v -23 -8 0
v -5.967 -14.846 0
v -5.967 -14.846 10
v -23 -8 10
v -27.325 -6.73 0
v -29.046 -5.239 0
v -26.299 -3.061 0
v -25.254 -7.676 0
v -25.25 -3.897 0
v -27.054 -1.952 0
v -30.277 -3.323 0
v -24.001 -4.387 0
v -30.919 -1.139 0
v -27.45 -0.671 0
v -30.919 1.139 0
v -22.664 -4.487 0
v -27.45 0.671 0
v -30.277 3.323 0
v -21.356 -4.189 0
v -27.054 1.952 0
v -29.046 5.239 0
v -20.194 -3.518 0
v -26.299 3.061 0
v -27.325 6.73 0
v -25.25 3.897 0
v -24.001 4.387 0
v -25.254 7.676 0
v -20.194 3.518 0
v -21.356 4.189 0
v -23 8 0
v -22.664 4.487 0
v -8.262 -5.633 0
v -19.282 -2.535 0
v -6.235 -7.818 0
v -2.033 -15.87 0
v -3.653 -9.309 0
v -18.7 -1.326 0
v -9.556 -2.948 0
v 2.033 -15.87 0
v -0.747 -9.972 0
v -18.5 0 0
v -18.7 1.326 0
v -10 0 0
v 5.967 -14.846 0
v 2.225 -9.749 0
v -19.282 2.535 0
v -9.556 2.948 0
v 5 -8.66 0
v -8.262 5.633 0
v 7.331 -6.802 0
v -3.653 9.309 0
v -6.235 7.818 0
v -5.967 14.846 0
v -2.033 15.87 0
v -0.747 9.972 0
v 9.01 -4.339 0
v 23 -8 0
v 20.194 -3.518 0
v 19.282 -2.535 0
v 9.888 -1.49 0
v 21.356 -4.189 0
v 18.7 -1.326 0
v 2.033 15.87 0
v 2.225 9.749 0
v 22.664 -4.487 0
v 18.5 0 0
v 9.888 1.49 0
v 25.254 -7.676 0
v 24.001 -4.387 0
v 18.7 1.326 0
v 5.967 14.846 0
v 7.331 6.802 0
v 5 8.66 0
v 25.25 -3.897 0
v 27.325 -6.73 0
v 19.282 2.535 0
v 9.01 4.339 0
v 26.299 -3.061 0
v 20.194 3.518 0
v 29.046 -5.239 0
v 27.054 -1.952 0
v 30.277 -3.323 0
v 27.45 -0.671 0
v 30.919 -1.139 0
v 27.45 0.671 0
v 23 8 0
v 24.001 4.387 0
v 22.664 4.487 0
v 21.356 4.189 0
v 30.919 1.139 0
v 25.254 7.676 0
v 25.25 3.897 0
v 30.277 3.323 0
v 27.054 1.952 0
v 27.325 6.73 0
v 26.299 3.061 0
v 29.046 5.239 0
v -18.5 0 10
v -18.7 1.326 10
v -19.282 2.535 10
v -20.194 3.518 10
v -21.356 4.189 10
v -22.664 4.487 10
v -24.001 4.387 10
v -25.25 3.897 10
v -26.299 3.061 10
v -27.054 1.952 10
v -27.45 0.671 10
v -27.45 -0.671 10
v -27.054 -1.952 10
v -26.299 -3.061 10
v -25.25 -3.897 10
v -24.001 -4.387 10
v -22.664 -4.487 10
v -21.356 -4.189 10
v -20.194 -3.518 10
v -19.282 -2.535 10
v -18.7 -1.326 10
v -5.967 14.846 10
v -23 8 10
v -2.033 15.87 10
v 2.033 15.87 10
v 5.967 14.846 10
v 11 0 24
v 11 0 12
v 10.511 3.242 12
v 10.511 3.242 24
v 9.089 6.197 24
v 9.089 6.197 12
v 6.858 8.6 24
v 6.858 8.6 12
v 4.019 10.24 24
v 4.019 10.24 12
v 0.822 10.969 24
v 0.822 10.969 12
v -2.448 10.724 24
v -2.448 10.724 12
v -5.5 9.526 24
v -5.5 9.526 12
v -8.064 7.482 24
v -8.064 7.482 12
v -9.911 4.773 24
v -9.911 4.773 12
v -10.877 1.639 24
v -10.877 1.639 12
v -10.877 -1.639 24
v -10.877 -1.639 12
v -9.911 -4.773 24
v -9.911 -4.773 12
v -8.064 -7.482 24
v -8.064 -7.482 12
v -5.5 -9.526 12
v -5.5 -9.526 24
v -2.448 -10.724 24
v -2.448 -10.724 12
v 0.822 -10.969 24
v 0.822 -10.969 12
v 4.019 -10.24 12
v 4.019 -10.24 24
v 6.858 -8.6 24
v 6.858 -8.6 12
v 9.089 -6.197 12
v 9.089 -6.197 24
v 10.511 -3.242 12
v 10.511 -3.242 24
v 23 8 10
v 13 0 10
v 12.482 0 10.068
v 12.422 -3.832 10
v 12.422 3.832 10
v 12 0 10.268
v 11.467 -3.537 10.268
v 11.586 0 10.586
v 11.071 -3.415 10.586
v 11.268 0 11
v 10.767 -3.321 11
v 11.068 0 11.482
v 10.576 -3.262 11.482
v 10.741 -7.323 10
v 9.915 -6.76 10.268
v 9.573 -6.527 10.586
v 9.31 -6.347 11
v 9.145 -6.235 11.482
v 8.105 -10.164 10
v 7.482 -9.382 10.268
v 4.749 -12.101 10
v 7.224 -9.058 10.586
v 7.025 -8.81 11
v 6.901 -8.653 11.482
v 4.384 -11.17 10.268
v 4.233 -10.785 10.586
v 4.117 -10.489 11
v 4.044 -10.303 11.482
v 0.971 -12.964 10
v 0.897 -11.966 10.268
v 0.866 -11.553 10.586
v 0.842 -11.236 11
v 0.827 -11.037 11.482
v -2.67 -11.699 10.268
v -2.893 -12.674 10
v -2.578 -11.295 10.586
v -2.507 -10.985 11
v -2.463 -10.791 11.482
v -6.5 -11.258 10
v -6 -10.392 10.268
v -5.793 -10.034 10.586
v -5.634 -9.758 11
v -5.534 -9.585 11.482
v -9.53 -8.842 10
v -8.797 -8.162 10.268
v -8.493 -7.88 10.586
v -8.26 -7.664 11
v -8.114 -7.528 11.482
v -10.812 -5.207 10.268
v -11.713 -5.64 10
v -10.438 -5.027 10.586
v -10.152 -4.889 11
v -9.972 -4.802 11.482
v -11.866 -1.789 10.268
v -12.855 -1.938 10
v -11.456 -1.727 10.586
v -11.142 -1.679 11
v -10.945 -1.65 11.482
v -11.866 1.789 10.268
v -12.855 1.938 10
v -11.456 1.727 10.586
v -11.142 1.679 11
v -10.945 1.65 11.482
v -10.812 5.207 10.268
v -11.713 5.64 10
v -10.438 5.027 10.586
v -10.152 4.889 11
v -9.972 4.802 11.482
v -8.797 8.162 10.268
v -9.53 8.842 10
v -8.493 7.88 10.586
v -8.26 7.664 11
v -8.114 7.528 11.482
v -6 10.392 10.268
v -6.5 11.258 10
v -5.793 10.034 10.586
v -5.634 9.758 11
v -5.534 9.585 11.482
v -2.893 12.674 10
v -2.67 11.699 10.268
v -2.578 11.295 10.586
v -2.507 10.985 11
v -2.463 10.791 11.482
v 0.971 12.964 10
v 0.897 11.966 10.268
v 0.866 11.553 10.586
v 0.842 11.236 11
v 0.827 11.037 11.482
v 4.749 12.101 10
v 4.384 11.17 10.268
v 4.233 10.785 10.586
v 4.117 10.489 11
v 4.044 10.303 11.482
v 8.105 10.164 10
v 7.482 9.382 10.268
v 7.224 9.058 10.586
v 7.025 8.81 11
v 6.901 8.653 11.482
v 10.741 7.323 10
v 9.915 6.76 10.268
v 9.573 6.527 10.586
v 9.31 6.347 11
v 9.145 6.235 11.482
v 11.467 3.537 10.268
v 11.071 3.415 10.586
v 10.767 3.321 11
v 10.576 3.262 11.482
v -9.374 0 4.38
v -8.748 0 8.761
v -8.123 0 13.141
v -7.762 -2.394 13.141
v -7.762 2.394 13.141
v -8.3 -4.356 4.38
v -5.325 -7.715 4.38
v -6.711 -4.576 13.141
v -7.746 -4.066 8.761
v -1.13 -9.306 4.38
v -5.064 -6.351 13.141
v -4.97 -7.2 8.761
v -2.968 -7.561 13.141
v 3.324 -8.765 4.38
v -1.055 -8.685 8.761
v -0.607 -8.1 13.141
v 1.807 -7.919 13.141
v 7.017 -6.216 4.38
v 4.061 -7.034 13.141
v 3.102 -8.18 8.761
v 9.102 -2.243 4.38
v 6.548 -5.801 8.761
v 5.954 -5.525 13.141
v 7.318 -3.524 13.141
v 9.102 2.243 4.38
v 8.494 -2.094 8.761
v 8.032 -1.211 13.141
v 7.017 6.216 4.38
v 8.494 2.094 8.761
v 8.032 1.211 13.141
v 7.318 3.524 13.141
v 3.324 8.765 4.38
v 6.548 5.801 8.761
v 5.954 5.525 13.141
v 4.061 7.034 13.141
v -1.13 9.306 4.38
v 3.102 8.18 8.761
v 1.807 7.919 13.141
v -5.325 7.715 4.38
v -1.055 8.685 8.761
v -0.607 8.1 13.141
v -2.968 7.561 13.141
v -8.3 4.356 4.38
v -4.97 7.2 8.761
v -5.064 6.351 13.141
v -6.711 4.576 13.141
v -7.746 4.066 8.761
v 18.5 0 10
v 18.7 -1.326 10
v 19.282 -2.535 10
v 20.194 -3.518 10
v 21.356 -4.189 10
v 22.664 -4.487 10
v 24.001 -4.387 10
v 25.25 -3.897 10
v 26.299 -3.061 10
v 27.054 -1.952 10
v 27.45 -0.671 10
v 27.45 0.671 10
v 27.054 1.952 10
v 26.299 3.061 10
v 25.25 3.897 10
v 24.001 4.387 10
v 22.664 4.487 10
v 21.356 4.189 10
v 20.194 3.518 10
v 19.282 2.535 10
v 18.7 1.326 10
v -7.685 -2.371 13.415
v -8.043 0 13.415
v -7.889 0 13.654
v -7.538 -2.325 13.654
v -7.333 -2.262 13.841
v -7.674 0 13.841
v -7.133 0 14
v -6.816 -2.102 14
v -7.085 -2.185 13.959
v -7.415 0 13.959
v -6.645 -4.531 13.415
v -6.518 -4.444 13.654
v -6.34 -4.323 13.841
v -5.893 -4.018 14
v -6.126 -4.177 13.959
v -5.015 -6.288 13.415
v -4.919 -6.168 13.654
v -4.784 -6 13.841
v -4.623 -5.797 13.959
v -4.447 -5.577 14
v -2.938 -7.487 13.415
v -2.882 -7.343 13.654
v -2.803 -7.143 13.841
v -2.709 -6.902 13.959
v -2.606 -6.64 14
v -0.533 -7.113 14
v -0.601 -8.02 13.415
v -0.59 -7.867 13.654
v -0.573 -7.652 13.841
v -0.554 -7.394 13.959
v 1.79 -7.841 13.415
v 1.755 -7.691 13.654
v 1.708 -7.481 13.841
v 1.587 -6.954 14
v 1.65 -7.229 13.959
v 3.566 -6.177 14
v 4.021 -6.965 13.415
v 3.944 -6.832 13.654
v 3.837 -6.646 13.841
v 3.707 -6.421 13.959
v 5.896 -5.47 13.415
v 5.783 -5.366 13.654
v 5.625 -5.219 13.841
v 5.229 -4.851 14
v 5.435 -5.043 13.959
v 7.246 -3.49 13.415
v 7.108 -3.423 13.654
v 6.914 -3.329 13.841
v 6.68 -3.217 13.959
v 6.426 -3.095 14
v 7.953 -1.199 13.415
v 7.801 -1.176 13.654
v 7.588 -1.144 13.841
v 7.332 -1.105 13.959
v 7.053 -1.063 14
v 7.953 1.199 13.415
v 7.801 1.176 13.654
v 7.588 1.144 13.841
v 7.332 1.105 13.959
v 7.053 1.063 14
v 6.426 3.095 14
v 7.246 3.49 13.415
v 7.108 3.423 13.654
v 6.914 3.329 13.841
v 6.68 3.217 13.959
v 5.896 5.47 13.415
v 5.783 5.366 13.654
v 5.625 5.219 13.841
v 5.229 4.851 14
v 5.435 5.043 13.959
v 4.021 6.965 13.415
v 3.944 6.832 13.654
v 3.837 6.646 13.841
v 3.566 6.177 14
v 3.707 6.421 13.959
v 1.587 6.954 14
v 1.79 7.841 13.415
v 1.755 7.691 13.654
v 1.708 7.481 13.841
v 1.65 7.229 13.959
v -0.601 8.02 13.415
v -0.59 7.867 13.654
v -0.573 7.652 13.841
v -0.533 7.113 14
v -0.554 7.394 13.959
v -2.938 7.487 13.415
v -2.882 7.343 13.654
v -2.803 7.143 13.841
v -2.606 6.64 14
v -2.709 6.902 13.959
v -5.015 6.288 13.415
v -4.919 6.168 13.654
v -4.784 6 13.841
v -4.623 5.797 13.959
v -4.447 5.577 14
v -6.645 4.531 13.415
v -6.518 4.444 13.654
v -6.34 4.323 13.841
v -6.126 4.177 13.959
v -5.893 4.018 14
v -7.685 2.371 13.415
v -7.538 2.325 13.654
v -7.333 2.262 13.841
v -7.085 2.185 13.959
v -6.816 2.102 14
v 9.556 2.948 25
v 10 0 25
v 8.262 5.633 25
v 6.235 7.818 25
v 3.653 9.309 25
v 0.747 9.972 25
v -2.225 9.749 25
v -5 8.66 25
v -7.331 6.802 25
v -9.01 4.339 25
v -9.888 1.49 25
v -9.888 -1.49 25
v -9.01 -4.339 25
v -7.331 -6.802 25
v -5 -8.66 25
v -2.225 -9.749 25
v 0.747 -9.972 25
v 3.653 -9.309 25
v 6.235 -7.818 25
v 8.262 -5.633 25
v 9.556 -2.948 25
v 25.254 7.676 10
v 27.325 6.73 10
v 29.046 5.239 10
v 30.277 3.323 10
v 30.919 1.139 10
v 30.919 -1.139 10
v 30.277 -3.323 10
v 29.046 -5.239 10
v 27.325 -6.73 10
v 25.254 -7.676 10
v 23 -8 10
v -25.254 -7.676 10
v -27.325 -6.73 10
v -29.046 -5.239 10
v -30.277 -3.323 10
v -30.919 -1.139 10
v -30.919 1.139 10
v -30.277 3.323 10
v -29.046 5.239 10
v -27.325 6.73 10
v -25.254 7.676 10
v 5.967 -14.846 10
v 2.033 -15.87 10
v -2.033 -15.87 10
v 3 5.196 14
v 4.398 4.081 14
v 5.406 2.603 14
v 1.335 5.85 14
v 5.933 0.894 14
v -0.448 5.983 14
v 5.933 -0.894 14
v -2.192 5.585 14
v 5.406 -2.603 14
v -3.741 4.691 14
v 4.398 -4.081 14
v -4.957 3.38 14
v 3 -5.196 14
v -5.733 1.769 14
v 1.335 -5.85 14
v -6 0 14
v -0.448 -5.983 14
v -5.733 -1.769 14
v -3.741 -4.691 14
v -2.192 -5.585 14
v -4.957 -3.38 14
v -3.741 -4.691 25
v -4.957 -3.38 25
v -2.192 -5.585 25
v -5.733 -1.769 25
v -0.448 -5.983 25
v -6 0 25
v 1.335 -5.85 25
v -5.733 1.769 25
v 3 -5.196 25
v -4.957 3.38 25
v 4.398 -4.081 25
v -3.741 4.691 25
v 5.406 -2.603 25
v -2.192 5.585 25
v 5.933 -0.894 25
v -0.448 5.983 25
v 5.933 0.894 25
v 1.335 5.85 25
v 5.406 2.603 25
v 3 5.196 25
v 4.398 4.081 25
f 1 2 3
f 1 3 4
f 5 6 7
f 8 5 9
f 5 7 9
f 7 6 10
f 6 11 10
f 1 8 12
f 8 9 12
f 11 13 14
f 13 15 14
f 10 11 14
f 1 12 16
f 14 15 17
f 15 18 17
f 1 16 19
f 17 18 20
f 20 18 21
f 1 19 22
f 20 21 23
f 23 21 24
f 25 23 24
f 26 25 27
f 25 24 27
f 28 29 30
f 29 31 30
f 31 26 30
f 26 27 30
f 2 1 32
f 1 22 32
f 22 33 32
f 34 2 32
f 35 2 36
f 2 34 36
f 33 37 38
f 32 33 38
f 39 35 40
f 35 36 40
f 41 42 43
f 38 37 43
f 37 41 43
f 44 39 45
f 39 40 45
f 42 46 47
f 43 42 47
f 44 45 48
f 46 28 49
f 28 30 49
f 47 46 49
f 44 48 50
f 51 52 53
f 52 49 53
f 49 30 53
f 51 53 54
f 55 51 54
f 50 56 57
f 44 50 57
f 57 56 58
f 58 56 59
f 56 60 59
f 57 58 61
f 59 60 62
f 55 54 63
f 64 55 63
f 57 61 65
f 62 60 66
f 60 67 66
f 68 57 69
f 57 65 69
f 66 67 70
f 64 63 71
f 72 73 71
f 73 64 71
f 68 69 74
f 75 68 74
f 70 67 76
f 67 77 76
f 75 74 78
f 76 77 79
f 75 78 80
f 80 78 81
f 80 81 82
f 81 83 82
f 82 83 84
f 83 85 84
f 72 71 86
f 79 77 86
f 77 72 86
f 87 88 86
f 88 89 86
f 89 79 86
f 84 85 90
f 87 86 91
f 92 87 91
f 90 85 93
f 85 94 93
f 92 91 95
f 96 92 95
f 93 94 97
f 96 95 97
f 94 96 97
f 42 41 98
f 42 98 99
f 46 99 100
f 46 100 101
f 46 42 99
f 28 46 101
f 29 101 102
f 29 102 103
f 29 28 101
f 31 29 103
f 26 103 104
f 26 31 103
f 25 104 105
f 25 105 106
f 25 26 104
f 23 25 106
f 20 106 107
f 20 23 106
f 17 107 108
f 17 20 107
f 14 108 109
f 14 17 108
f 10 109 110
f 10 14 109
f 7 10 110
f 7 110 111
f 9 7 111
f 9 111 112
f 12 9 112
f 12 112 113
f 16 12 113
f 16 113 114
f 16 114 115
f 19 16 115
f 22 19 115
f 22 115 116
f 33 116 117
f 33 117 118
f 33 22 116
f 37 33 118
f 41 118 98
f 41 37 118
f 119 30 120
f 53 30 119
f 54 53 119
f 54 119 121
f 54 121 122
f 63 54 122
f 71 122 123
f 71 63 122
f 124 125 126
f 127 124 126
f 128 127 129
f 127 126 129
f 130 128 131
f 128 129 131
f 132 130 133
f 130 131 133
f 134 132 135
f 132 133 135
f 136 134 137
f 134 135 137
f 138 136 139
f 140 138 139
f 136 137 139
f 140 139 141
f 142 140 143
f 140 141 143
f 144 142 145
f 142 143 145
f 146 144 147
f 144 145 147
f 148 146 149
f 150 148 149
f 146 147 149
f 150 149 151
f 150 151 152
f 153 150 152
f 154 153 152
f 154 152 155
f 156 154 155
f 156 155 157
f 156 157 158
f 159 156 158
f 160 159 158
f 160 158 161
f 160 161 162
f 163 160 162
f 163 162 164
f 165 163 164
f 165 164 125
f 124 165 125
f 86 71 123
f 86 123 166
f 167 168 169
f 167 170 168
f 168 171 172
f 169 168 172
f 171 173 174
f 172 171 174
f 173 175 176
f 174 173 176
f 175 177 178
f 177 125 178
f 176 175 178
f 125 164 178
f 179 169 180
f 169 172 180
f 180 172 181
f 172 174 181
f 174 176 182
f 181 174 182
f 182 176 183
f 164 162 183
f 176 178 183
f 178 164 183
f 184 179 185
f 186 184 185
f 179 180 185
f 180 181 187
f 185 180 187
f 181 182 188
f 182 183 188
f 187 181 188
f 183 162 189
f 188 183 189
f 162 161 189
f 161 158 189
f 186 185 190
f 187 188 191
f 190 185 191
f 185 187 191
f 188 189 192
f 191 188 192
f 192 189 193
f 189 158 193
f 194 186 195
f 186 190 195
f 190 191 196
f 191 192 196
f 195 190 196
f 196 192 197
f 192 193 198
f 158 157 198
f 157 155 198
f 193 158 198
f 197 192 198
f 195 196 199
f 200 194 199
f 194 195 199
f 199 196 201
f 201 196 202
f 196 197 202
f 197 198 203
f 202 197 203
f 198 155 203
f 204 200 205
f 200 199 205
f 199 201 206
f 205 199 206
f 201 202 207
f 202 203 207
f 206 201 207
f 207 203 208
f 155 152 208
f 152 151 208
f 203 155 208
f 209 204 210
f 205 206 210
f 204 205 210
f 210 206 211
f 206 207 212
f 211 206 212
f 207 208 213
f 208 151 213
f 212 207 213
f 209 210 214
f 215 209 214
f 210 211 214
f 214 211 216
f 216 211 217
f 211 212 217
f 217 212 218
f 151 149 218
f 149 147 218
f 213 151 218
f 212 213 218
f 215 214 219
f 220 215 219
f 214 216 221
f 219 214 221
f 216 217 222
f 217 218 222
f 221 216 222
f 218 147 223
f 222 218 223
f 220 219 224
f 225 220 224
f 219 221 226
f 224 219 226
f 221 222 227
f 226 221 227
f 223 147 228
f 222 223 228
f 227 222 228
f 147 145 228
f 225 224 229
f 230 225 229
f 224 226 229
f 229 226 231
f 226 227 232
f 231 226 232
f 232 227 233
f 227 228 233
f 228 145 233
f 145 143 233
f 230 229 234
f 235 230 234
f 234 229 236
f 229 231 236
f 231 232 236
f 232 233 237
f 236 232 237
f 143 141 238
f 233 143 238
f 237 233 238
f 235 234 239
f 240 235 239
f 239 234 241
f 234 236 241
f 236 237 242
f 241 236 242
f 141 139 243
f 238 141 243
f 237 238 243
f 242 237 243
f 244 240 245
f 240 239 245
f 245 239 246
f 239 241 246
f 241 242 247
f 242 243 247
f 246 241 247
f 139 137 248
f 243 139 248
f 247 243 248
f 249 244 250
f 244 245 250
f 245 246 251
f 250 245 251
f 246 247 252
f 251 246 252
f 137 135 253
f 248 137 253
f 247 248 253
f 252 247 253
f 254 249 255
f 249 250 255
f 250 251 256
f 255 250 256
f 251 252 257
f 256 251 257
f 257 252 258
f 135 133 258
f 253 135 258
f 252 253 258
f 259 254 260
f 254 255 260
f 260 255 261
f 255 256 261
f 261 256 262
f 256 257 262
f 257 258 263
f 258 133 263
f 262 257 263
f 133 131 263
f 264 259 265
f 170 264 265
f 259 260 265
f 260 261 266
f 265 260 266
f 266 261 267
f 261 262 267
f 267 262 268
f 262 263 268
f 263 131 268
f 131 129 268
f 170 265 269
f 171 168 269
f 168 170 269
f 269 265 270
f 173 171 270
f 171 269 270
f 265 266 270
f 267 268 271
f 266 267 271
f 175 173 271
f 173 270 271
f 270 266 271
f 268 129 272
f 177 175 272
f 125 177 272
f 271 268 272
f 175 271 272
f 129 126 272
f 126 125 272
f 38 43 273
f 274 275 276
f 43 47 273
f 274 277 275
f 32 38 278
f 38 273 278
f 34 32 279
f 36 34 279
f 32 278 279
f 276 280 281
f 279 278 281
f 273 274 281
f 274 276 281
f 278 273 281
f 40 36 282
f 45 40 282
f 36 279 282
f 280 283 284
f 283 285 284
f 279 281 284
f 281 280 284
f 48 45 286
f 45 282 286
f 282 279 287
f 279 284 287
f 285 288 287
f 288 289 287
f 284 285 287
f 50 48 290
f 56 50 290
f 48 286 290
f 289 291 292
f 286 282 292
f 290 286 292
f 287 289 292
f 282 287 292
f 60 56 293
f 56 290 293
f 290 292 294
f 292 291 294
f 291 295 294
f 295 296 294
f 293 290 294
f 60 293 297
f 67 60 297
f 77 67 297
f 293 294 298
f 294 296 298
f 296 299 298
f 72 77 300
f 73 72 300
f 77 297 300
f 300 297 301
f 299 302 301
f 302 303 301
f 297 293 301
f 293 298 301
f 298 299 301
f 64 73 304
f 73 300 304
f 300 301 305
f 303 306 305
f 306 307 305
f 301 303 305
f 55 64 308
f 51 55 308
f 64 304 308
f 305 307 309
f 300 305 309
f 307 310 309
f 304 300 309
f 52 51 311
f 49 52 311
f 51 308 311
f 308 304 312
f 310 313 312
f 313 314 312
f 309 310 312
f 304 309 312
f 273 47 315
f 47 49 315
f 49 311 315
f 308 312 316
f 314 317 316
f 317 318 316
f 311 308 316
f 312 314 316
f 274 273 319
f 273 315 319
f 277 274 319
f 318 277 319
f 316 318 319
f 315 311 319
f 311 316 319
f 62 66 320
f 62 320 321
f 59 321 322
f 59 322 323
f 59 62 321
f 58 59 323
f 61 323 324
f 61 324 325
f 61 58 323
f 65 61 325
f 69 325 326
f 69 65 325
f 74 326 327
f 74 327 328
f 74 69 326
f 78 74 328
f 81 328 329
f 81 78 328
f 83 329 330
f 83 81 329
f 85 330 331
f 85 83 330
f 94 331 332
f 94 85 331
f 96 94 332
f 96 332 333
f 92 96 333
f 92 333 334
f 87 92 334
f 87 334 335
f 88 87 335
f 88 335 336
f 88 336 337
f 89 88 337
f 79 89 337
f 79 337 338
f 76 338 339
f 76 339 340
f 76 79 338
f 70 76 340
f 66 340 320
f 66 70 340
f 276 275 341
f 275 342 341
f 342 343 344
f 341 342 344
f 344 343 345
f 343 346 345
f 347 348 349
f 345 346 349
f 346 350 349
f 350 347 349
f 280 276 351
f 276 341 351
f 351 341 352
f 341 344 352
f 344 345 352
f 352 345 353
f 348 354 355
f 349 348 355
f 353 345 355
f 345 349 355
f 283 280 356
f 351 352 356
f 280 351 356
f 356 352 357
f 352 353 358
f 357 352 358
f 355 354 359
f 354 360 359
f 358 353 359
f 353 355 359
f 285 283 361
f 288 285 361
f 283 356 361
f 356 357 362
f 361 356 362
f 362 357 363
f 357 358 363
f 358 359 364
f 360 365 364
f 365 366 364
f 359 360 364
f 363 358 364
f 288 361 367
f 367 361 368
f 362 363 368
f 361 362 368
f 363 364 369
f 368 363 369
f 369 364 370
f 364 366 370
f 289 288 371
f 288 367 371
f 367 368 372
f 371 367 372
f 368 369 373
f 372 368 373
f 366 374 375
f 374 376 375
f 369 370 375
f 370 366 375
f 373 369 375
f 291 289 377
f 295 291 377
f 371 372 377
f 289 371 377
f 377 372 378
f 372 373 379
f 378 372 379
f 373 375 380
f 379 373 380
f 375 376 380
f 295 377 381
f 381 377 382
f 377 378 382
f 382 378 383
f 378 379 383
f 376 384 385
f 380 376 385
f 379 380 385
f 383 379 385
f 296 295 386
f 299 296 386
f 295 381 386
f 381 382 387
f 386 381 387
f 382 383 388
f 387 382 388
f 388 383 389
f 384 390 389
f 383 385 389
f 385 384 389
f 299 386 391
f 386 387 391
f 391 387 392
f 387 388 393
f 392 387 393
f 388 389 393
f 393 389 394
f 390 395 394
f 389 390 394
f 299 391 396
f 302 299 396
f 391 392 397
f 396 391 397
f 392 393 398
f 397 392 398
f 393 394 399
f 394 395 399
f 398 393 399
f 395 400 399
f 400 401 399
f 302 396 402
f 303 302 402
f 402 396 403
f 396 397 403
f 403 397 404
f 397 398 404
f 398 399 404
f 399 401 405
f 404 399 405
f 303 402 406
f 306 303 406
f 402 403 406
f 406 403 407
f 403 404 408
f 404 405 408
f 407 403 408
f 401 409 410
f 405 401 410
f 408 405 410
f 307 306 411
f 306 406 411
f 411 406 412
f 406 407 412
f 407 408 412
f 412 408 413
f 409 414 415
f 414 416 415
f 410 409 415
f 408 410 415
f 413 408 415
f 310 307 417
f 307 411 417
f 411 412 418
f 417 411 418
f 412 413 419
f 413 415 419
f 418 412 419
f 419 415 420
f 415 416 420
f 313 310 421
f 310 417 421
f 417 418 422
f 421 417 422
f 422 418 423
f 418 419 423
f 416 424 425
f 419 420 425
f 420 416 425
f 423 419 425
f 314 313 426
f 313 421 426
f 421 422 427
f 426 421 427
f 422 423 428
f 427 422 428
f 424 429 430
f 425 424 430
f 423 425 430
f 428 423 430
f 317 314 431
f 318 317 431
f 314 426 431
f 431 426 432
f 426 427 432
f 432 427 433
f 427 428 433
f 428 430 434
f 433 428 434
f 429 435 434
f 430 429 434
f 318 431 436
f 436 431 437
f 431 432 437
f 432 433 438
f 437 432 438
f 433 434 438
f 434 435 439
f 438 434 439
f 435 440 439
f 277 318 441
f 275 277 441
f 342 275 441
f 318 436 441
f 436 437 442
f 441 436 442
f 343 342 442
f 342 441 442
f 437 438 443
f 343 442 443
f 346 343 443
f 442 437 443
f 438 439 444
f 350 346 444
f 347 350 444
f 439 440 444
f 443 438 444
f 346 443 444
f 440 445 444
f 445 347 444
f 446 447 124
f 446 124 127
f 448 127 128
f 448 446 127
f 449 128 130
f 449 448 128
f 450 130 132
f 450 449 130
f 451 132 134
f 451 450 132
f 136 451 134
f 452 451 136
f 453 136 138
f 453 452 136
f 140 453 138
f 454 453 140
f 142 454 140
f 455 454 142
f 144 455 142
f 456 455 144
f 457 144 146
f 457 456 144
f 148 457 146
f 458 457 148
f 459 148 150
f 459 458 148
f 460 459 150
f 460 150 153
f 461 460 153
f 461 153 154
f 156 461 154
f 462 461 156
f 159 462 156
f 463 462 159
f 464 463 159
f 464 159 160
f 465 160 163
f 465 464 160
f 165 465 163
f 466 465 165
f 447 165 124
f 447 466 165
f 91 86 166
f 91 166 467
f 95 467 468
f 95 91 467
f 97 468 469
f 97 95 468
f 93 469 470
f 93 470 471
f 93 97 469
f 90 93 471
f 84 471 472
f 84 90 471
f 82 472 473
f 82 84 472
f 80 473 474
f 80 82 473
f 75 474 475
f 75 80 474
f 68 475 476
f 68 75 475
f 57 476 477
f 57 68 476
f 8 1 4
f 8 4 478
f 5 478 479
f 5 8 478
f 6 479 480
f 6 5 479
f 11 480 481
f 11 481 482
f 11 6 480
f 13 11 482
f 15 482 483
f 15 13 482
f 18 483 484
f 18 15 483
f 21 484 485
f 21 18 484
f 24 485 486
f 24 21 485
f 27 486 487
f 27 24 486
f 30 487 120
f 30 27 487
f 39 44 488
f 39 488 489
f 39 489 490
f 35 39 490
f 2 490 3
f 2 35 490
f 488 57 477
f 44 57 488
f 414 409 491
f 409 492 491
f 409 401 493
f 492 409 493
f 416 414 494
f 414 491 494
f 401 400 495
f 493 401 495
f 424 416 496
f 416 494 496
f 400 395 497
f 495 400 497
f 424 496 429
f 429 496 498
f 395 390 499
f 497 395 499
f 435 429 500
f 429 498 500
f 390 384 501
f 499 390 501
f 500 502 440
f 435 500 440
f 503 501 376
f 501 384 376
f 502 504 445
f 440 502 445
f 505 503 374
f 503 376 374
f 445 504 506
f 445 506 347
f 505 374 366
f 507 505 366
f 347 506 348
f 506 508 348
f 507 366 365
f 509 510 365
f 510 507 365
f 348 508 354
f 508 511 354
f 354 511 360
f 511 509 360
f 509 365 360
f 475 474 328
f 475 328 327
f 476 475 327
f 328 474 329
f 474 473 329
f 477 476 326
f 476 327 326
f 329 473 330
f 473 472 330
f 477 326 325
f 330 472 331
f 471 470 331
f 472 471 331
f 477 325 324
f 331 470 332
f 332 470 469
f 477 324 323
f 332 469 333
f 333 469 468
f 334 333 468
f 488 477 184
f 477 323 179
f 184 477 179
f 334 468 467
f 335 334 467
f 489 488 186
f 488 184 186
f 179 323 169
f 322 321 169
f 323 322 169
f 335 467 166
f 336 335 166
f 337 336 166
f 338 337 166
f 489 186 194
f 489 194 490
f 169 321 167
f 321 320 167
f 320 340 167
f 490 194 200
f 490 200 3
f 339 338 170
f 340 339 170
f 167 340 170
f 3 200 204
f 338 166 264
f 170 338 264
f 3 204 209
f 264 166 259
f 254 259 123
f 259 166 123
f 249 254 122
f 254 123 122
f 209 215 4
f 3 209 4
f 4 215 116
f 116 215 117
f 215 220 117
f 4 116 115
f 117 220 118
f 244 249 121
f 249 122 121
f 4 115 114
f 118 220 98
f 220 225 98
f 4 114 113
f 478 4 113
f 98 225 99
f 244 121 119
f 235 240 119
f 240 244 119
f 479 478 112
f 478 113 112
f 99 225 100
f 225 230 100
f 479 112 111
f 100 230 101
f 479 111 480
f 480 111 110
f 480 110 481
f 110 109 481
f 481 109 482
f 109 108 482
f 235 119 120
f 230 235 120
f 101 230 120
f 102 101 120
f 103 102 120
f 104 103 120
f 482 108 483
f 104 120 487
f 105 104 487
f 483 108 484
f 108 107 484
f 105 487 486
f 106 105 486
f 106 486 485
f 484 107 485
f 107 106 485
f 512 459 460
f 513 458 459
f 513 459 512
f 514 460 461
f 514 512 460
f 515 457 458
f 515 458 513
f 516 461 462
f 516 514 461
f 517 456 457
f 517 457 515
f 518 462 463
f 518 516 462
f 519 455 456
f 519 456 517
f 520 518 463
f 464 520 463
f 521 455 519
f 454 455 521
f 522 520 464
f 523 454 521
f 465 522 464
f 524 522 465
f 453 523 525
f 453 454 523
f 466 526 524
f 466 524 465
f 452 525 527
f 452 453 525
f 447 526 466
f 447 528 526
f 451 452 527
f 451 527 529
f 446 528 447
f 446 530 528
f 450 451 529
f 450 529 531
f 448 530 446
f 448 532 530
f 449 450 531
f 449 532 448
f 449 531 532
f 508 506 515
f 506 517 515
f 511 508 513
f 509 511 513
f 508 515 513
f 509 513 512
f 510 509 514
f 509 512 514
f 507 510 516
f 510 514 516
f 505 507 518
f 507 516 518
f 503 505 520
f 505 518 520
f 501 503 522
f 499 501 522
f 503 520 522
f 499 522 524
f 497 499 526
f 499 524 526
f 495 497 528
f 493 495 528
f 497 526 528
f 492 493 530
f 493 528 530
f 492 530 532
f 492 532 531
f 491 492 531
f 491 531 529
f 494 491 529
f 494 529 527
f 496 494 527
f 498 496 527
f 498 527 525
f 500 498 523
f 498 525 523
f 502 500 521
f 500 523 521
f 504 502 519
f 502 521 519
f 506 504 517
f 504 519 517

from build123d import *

# Parameters (mm, degrees)
SKETCH_1_R      = 4.5
EXTRUDE_1_DEPTH = 10
SKETCH_4_R      = 11
EXTRUDE_2_DEPTH = 25
FILLET_1_R      = 2
CHAMFER_1_SIZE  = 1


with BuildPart() as part:
    # Эскиз1 → Бобышка-Вытянуть1 (new body)
    with BuildSketch(Plane.XY):
        with BuildLine():
            Line((-23, 8), (-5.966665012, 14.845838091))
            ThreePointArc((-5.966665012, 14.845838091), (0, 16), (5.966665012, 14.845838091))
            Line((5.966665012, 14.845838091), (23, 8))
            ThreePointArc((23, 8), (31, 0), (23, -8))
            Line((23, -8), (5.966665012, -14.845838091))
            ThreePointArc((5.966665012, -14.845838091), (0, -16), (-5.966665012, -14.845838091))
            Line((-5.966665012, -14.845838091), (-23, -8))
            ThreePointArc((-23, -8), (-31, 0), (-23, 8))
        make_face()
        with Locations((-23, 0)):
            Circle(SKETCH_1_R, mode=Mode.SUBTRACT)
        with Locations(Location((23, 0, 0), (0, 0, 180))):
            Circle(SKETCH_1_R, mode=Mode.SUBTRACT)
    extrude(amount=EXTRUDE_1_DEPTH)

    # Эскиз4 → Бобышка-Вытянуть2 (add)
    with BuildSketch(Plane.XY):
        Circle(SKETCH_4_R)
    extrude(amount=EXTRUDE_2_DEPTH)

    # Эскиз5 → Вырез-Повернуть1 (revolve, cut)
    with BuildSketch(Plane(origin=(0, 0, 0), x_dir=(1, 0, 0), z_dir=(0, 1, 0))):
        with BuildLine():
            Line((0, 0), (-10, 0))
            Line((-10, 0), (-8.122654092, -13.141421356))
            ThreePointArc((-8.122654092, -13.141421356), (-7.78790634, -13.755453955), (-7.132704598, -14))
            Line((-7.132704598, -14), (-6, -14))
            Line((-6, -14), (-6, -25))
            Line((-6, -25), (0, -25))
            Line((0, -25), (0, 0))
        make_face()
    revolve(axis=Axis((0, 0, -38.345280775), (0, 0, 1)), mode=Mode.SUBTRACT)

    # Скругление1
    fillet_1_edges = [part.edges().sort_by_distance(p)[0] for p in [
        (-11, 0, 10),
    ]]
    fillet(fillet_1_edges, radius=FILLET_1_R)

    # Фаска1
    chamfer_1_edges = [part.edges().sort_by_distance(p)[0] for p in [
        (-11, 0, 25),
    ]]
    chamfer(chamfer_1_edges, length=CHAMFER_1_SIZE)


solid = part.part
